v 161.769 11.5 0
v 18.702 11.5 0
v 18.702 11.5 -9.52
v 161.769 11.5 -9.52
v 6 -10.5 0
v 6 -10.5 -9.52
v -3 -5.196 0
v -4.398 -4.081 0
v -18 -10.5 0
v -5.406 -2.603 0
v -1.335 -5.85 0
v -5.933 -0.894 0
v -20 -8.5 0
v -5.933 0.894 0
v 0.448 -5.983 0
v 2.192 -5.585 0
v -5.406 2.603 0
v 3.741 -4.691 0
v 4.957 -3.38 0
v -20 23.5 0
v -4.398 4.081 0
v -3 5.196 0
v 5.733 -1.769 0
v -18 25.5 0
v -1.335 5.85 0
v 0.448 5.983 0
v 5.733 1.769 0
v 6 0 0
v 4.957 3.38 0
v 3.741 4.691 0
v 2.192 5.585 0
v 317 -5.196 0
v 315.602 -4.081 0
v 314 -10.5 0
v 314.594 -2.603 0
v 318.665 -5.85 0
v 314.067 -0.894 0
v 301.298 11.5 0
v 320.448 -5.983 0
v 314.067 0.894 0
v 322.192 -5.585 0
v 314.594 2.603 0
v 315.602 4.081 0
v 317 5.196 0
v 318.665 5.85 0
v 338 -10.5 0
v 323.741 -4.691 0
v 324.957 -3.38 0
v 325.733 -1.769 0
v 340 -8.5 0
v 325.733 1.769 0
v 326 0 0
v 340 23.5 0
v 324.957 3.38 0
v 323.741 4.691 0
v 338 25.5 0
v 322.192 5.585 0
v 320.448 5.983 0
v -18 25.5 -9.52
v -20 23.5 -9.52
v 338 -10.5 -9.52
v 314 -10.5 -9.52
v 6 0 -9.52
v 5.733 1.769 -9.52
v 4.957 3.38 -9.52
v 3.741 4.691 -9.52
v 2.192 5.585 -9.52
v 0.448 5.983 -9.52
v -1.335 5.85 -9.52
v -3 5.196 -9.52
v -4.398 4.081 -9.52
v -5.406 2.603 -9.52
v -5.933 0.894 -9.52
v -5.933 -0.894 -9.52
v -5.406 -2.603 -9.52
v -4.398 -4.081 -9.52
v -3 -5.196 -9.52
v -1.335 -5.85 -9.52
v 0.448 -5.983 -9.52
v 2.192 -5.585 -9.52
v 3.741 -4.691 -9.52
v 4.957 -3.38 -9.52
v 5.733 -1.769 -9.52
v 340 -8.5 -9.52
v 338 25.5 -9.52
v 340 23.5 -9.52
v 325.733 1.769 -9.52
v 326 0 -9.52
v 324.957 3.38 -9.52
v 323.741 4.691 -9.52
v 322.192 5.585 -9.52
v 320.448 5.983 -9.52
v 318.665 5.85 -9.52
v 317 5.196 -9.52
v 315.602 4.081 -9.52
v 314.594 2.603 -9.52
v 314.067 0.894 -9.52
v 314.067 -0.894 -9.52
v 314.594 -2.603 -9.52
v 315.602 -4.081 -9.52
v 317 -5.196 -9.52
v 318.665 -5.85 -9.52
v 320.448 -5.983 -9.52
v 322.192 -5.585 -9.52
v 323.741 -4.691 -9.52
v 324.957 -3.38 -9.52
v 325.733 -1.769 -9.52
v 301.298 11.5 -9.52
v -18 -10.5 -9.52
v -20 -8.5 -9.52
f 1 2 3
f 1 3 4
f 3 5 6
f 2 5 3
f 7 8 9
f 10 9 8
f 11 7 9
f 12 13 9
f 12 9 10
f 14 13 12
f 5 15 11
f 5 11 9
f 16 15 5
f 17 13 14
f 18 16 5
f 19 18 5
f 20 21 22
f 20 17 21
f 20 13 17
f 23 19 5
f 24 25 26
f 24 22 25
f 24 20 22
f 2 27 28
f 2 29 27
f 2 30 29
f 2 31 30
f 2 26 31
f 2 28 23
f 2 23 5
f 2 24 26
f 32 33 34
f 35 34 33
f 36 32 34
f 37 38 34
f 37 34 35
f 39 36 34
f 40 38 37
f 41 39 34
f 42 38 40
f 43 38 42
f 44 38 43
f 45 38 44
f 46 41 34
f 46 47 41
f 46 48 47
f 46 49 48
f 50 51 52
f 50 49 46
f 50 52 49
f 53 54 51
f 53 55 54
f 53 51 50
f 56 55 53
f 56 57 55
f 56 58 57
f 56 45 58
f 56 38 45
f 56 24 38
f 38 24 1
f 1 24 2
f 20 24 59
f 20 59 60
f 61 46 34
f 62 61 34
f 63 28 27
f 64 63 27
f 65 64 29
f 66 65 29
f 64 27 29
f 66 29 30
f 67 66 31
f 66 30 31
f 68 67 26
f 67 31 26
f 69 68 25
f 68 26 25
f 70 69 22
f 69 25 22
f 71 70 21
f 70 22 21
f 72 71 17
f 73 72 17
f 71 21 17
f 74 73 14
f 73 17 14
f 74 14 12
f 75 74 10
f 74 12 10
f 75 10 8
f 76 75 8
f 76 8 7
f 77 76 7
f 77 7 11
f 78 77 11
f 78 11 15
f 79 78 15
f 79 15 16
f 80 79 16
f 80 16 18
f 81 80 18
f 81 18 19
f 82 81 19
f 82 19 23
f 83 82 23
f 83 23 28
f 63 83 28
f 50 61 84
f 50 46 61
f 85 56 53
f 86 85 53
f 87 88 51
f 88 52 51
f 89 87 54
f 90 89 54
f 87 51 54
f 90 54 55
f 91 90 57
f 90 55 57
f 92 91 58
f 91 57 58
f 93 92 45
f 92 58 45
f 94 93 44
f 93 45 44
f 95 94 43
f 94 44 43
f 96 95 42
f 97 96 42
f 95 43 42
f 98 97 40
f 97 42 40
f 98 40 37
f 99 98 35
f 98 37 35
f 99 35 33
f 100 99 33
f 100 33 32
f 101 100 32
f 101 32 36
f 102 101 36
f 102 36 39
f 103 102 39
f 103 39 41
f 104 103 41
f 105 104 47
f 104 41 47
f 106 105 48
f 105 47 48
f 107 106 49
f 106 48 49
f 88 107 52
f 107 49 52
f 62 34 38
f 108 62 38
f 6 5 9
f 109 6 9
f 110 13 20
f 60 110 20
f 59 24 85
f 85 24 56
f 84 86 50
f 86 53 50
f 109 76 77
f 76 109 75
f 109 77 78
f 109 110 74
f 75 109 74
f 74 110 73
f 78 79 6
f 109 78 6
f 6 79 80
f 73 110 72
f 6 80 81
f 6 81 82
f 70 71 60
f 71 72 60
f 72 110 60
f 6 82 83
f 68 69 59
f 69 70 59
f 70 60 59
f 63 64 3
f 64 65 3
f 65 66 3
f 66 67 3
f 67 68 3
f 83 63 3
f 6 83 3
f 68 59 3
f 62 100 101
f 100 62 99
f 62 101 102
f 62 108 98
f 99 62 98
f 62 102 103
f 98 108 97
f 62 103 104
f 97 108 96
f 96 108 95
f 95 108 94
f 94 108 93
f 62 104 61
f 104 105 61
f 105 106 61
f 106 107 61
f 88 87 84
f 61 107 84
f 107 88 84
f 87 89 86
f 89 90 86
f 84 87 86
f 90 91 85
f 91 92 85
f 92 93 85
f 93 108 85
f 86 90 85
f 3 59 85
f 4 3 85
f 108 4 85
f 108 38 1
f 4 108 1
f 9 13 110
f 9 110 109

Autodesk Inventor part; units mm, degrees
ref_plane "YZ Plane" through (0, 0, 0) normal (1, 0, 0) x (0, 1, 0)
ref_plane "XZ Plane" through (0, 0, 0) normal (0, 1, 0) x (-1, 0, 0)
ref_plane "XY Plane" through (0, 0, 0) normal (0, 0, 1) x (1, 0, 0)
sketch "Esboço1" plane through (0, 0, 0) normal (0, 0, 1) x (1, 0, 0)
  line L0 (-18, 25.5) -> (338, 25.5)
  line L1 (340, 23.5) -> (340, -8.5)
  line L2 (-20, -8.5) -> (-20, 23.5)
  circle A0 centre (0, 0) radius 5.995 construction
  circle A1 centre (320, 0) radius 5.995 construction
  line L3 (6, -10.5) -> (18.7017, 11.5)
  line L4 (6, -10.5) -> (31.4034, -10.5) construction
  line L5 (18.7017, 11.5) -> (161.7689, 11.5)
  line L6 (160, 31.3493) -> (160, -25.519) construction
  line L7 (314, -10.5) -> (301.2983, 11.5)
  line L8 (301.2983, 11.5) -> (161.7689, 11.5)
  line L9 (-18, 25.5) -> (-20, 23.5)
  line L10 (-20, -8.5) -> (-18, -10.5)
  line L11 (338, 25.5) -> (340, 23.5)
  line L12 (338, -10.5) -> (340, -8.5)
  line L13 (338, -10.5) -> (314, -10.5)
  line L14 (6, -10.5) -> (-18, -10.5)
  circle A2 centre (0, 0) radius 6
  circle A3 centre (320, 0) radius 6
  point P0 (340, -10.5)
  point P1 (340, 25.5)
  point P2 (-20, -10.5)
  point P3 (-20, 25.5)
  dimension "d0" = 36
  dimension "d2" = 2
  dimension "d3" = 2
  dimension "d4" = 2
  dimension "d5" = 2
  dimension "d6" = 2
  dimension "d7" = 2
  dimension "d8" = 2
  dimension "d9" = 2
  dimension "d10" = 12
  dimension "d11" = 12
  dimension "d14" = 120
  dimension "d15" = 14
  dimension "d16" = 24
extrude "Extrusão1" add sketch "Esboço1" against normal blind 9.52
equation "\"d3\" = d2"
equation "\"d4\" = d2"
equation "\"d5\" = d4"
equation "\"d6\" = d2"
equation "\"d7\" = d6"
equation "\"d8\" = d2"
equation "\"d9\" = d8"
properties part number "EsbarrosCarro"
